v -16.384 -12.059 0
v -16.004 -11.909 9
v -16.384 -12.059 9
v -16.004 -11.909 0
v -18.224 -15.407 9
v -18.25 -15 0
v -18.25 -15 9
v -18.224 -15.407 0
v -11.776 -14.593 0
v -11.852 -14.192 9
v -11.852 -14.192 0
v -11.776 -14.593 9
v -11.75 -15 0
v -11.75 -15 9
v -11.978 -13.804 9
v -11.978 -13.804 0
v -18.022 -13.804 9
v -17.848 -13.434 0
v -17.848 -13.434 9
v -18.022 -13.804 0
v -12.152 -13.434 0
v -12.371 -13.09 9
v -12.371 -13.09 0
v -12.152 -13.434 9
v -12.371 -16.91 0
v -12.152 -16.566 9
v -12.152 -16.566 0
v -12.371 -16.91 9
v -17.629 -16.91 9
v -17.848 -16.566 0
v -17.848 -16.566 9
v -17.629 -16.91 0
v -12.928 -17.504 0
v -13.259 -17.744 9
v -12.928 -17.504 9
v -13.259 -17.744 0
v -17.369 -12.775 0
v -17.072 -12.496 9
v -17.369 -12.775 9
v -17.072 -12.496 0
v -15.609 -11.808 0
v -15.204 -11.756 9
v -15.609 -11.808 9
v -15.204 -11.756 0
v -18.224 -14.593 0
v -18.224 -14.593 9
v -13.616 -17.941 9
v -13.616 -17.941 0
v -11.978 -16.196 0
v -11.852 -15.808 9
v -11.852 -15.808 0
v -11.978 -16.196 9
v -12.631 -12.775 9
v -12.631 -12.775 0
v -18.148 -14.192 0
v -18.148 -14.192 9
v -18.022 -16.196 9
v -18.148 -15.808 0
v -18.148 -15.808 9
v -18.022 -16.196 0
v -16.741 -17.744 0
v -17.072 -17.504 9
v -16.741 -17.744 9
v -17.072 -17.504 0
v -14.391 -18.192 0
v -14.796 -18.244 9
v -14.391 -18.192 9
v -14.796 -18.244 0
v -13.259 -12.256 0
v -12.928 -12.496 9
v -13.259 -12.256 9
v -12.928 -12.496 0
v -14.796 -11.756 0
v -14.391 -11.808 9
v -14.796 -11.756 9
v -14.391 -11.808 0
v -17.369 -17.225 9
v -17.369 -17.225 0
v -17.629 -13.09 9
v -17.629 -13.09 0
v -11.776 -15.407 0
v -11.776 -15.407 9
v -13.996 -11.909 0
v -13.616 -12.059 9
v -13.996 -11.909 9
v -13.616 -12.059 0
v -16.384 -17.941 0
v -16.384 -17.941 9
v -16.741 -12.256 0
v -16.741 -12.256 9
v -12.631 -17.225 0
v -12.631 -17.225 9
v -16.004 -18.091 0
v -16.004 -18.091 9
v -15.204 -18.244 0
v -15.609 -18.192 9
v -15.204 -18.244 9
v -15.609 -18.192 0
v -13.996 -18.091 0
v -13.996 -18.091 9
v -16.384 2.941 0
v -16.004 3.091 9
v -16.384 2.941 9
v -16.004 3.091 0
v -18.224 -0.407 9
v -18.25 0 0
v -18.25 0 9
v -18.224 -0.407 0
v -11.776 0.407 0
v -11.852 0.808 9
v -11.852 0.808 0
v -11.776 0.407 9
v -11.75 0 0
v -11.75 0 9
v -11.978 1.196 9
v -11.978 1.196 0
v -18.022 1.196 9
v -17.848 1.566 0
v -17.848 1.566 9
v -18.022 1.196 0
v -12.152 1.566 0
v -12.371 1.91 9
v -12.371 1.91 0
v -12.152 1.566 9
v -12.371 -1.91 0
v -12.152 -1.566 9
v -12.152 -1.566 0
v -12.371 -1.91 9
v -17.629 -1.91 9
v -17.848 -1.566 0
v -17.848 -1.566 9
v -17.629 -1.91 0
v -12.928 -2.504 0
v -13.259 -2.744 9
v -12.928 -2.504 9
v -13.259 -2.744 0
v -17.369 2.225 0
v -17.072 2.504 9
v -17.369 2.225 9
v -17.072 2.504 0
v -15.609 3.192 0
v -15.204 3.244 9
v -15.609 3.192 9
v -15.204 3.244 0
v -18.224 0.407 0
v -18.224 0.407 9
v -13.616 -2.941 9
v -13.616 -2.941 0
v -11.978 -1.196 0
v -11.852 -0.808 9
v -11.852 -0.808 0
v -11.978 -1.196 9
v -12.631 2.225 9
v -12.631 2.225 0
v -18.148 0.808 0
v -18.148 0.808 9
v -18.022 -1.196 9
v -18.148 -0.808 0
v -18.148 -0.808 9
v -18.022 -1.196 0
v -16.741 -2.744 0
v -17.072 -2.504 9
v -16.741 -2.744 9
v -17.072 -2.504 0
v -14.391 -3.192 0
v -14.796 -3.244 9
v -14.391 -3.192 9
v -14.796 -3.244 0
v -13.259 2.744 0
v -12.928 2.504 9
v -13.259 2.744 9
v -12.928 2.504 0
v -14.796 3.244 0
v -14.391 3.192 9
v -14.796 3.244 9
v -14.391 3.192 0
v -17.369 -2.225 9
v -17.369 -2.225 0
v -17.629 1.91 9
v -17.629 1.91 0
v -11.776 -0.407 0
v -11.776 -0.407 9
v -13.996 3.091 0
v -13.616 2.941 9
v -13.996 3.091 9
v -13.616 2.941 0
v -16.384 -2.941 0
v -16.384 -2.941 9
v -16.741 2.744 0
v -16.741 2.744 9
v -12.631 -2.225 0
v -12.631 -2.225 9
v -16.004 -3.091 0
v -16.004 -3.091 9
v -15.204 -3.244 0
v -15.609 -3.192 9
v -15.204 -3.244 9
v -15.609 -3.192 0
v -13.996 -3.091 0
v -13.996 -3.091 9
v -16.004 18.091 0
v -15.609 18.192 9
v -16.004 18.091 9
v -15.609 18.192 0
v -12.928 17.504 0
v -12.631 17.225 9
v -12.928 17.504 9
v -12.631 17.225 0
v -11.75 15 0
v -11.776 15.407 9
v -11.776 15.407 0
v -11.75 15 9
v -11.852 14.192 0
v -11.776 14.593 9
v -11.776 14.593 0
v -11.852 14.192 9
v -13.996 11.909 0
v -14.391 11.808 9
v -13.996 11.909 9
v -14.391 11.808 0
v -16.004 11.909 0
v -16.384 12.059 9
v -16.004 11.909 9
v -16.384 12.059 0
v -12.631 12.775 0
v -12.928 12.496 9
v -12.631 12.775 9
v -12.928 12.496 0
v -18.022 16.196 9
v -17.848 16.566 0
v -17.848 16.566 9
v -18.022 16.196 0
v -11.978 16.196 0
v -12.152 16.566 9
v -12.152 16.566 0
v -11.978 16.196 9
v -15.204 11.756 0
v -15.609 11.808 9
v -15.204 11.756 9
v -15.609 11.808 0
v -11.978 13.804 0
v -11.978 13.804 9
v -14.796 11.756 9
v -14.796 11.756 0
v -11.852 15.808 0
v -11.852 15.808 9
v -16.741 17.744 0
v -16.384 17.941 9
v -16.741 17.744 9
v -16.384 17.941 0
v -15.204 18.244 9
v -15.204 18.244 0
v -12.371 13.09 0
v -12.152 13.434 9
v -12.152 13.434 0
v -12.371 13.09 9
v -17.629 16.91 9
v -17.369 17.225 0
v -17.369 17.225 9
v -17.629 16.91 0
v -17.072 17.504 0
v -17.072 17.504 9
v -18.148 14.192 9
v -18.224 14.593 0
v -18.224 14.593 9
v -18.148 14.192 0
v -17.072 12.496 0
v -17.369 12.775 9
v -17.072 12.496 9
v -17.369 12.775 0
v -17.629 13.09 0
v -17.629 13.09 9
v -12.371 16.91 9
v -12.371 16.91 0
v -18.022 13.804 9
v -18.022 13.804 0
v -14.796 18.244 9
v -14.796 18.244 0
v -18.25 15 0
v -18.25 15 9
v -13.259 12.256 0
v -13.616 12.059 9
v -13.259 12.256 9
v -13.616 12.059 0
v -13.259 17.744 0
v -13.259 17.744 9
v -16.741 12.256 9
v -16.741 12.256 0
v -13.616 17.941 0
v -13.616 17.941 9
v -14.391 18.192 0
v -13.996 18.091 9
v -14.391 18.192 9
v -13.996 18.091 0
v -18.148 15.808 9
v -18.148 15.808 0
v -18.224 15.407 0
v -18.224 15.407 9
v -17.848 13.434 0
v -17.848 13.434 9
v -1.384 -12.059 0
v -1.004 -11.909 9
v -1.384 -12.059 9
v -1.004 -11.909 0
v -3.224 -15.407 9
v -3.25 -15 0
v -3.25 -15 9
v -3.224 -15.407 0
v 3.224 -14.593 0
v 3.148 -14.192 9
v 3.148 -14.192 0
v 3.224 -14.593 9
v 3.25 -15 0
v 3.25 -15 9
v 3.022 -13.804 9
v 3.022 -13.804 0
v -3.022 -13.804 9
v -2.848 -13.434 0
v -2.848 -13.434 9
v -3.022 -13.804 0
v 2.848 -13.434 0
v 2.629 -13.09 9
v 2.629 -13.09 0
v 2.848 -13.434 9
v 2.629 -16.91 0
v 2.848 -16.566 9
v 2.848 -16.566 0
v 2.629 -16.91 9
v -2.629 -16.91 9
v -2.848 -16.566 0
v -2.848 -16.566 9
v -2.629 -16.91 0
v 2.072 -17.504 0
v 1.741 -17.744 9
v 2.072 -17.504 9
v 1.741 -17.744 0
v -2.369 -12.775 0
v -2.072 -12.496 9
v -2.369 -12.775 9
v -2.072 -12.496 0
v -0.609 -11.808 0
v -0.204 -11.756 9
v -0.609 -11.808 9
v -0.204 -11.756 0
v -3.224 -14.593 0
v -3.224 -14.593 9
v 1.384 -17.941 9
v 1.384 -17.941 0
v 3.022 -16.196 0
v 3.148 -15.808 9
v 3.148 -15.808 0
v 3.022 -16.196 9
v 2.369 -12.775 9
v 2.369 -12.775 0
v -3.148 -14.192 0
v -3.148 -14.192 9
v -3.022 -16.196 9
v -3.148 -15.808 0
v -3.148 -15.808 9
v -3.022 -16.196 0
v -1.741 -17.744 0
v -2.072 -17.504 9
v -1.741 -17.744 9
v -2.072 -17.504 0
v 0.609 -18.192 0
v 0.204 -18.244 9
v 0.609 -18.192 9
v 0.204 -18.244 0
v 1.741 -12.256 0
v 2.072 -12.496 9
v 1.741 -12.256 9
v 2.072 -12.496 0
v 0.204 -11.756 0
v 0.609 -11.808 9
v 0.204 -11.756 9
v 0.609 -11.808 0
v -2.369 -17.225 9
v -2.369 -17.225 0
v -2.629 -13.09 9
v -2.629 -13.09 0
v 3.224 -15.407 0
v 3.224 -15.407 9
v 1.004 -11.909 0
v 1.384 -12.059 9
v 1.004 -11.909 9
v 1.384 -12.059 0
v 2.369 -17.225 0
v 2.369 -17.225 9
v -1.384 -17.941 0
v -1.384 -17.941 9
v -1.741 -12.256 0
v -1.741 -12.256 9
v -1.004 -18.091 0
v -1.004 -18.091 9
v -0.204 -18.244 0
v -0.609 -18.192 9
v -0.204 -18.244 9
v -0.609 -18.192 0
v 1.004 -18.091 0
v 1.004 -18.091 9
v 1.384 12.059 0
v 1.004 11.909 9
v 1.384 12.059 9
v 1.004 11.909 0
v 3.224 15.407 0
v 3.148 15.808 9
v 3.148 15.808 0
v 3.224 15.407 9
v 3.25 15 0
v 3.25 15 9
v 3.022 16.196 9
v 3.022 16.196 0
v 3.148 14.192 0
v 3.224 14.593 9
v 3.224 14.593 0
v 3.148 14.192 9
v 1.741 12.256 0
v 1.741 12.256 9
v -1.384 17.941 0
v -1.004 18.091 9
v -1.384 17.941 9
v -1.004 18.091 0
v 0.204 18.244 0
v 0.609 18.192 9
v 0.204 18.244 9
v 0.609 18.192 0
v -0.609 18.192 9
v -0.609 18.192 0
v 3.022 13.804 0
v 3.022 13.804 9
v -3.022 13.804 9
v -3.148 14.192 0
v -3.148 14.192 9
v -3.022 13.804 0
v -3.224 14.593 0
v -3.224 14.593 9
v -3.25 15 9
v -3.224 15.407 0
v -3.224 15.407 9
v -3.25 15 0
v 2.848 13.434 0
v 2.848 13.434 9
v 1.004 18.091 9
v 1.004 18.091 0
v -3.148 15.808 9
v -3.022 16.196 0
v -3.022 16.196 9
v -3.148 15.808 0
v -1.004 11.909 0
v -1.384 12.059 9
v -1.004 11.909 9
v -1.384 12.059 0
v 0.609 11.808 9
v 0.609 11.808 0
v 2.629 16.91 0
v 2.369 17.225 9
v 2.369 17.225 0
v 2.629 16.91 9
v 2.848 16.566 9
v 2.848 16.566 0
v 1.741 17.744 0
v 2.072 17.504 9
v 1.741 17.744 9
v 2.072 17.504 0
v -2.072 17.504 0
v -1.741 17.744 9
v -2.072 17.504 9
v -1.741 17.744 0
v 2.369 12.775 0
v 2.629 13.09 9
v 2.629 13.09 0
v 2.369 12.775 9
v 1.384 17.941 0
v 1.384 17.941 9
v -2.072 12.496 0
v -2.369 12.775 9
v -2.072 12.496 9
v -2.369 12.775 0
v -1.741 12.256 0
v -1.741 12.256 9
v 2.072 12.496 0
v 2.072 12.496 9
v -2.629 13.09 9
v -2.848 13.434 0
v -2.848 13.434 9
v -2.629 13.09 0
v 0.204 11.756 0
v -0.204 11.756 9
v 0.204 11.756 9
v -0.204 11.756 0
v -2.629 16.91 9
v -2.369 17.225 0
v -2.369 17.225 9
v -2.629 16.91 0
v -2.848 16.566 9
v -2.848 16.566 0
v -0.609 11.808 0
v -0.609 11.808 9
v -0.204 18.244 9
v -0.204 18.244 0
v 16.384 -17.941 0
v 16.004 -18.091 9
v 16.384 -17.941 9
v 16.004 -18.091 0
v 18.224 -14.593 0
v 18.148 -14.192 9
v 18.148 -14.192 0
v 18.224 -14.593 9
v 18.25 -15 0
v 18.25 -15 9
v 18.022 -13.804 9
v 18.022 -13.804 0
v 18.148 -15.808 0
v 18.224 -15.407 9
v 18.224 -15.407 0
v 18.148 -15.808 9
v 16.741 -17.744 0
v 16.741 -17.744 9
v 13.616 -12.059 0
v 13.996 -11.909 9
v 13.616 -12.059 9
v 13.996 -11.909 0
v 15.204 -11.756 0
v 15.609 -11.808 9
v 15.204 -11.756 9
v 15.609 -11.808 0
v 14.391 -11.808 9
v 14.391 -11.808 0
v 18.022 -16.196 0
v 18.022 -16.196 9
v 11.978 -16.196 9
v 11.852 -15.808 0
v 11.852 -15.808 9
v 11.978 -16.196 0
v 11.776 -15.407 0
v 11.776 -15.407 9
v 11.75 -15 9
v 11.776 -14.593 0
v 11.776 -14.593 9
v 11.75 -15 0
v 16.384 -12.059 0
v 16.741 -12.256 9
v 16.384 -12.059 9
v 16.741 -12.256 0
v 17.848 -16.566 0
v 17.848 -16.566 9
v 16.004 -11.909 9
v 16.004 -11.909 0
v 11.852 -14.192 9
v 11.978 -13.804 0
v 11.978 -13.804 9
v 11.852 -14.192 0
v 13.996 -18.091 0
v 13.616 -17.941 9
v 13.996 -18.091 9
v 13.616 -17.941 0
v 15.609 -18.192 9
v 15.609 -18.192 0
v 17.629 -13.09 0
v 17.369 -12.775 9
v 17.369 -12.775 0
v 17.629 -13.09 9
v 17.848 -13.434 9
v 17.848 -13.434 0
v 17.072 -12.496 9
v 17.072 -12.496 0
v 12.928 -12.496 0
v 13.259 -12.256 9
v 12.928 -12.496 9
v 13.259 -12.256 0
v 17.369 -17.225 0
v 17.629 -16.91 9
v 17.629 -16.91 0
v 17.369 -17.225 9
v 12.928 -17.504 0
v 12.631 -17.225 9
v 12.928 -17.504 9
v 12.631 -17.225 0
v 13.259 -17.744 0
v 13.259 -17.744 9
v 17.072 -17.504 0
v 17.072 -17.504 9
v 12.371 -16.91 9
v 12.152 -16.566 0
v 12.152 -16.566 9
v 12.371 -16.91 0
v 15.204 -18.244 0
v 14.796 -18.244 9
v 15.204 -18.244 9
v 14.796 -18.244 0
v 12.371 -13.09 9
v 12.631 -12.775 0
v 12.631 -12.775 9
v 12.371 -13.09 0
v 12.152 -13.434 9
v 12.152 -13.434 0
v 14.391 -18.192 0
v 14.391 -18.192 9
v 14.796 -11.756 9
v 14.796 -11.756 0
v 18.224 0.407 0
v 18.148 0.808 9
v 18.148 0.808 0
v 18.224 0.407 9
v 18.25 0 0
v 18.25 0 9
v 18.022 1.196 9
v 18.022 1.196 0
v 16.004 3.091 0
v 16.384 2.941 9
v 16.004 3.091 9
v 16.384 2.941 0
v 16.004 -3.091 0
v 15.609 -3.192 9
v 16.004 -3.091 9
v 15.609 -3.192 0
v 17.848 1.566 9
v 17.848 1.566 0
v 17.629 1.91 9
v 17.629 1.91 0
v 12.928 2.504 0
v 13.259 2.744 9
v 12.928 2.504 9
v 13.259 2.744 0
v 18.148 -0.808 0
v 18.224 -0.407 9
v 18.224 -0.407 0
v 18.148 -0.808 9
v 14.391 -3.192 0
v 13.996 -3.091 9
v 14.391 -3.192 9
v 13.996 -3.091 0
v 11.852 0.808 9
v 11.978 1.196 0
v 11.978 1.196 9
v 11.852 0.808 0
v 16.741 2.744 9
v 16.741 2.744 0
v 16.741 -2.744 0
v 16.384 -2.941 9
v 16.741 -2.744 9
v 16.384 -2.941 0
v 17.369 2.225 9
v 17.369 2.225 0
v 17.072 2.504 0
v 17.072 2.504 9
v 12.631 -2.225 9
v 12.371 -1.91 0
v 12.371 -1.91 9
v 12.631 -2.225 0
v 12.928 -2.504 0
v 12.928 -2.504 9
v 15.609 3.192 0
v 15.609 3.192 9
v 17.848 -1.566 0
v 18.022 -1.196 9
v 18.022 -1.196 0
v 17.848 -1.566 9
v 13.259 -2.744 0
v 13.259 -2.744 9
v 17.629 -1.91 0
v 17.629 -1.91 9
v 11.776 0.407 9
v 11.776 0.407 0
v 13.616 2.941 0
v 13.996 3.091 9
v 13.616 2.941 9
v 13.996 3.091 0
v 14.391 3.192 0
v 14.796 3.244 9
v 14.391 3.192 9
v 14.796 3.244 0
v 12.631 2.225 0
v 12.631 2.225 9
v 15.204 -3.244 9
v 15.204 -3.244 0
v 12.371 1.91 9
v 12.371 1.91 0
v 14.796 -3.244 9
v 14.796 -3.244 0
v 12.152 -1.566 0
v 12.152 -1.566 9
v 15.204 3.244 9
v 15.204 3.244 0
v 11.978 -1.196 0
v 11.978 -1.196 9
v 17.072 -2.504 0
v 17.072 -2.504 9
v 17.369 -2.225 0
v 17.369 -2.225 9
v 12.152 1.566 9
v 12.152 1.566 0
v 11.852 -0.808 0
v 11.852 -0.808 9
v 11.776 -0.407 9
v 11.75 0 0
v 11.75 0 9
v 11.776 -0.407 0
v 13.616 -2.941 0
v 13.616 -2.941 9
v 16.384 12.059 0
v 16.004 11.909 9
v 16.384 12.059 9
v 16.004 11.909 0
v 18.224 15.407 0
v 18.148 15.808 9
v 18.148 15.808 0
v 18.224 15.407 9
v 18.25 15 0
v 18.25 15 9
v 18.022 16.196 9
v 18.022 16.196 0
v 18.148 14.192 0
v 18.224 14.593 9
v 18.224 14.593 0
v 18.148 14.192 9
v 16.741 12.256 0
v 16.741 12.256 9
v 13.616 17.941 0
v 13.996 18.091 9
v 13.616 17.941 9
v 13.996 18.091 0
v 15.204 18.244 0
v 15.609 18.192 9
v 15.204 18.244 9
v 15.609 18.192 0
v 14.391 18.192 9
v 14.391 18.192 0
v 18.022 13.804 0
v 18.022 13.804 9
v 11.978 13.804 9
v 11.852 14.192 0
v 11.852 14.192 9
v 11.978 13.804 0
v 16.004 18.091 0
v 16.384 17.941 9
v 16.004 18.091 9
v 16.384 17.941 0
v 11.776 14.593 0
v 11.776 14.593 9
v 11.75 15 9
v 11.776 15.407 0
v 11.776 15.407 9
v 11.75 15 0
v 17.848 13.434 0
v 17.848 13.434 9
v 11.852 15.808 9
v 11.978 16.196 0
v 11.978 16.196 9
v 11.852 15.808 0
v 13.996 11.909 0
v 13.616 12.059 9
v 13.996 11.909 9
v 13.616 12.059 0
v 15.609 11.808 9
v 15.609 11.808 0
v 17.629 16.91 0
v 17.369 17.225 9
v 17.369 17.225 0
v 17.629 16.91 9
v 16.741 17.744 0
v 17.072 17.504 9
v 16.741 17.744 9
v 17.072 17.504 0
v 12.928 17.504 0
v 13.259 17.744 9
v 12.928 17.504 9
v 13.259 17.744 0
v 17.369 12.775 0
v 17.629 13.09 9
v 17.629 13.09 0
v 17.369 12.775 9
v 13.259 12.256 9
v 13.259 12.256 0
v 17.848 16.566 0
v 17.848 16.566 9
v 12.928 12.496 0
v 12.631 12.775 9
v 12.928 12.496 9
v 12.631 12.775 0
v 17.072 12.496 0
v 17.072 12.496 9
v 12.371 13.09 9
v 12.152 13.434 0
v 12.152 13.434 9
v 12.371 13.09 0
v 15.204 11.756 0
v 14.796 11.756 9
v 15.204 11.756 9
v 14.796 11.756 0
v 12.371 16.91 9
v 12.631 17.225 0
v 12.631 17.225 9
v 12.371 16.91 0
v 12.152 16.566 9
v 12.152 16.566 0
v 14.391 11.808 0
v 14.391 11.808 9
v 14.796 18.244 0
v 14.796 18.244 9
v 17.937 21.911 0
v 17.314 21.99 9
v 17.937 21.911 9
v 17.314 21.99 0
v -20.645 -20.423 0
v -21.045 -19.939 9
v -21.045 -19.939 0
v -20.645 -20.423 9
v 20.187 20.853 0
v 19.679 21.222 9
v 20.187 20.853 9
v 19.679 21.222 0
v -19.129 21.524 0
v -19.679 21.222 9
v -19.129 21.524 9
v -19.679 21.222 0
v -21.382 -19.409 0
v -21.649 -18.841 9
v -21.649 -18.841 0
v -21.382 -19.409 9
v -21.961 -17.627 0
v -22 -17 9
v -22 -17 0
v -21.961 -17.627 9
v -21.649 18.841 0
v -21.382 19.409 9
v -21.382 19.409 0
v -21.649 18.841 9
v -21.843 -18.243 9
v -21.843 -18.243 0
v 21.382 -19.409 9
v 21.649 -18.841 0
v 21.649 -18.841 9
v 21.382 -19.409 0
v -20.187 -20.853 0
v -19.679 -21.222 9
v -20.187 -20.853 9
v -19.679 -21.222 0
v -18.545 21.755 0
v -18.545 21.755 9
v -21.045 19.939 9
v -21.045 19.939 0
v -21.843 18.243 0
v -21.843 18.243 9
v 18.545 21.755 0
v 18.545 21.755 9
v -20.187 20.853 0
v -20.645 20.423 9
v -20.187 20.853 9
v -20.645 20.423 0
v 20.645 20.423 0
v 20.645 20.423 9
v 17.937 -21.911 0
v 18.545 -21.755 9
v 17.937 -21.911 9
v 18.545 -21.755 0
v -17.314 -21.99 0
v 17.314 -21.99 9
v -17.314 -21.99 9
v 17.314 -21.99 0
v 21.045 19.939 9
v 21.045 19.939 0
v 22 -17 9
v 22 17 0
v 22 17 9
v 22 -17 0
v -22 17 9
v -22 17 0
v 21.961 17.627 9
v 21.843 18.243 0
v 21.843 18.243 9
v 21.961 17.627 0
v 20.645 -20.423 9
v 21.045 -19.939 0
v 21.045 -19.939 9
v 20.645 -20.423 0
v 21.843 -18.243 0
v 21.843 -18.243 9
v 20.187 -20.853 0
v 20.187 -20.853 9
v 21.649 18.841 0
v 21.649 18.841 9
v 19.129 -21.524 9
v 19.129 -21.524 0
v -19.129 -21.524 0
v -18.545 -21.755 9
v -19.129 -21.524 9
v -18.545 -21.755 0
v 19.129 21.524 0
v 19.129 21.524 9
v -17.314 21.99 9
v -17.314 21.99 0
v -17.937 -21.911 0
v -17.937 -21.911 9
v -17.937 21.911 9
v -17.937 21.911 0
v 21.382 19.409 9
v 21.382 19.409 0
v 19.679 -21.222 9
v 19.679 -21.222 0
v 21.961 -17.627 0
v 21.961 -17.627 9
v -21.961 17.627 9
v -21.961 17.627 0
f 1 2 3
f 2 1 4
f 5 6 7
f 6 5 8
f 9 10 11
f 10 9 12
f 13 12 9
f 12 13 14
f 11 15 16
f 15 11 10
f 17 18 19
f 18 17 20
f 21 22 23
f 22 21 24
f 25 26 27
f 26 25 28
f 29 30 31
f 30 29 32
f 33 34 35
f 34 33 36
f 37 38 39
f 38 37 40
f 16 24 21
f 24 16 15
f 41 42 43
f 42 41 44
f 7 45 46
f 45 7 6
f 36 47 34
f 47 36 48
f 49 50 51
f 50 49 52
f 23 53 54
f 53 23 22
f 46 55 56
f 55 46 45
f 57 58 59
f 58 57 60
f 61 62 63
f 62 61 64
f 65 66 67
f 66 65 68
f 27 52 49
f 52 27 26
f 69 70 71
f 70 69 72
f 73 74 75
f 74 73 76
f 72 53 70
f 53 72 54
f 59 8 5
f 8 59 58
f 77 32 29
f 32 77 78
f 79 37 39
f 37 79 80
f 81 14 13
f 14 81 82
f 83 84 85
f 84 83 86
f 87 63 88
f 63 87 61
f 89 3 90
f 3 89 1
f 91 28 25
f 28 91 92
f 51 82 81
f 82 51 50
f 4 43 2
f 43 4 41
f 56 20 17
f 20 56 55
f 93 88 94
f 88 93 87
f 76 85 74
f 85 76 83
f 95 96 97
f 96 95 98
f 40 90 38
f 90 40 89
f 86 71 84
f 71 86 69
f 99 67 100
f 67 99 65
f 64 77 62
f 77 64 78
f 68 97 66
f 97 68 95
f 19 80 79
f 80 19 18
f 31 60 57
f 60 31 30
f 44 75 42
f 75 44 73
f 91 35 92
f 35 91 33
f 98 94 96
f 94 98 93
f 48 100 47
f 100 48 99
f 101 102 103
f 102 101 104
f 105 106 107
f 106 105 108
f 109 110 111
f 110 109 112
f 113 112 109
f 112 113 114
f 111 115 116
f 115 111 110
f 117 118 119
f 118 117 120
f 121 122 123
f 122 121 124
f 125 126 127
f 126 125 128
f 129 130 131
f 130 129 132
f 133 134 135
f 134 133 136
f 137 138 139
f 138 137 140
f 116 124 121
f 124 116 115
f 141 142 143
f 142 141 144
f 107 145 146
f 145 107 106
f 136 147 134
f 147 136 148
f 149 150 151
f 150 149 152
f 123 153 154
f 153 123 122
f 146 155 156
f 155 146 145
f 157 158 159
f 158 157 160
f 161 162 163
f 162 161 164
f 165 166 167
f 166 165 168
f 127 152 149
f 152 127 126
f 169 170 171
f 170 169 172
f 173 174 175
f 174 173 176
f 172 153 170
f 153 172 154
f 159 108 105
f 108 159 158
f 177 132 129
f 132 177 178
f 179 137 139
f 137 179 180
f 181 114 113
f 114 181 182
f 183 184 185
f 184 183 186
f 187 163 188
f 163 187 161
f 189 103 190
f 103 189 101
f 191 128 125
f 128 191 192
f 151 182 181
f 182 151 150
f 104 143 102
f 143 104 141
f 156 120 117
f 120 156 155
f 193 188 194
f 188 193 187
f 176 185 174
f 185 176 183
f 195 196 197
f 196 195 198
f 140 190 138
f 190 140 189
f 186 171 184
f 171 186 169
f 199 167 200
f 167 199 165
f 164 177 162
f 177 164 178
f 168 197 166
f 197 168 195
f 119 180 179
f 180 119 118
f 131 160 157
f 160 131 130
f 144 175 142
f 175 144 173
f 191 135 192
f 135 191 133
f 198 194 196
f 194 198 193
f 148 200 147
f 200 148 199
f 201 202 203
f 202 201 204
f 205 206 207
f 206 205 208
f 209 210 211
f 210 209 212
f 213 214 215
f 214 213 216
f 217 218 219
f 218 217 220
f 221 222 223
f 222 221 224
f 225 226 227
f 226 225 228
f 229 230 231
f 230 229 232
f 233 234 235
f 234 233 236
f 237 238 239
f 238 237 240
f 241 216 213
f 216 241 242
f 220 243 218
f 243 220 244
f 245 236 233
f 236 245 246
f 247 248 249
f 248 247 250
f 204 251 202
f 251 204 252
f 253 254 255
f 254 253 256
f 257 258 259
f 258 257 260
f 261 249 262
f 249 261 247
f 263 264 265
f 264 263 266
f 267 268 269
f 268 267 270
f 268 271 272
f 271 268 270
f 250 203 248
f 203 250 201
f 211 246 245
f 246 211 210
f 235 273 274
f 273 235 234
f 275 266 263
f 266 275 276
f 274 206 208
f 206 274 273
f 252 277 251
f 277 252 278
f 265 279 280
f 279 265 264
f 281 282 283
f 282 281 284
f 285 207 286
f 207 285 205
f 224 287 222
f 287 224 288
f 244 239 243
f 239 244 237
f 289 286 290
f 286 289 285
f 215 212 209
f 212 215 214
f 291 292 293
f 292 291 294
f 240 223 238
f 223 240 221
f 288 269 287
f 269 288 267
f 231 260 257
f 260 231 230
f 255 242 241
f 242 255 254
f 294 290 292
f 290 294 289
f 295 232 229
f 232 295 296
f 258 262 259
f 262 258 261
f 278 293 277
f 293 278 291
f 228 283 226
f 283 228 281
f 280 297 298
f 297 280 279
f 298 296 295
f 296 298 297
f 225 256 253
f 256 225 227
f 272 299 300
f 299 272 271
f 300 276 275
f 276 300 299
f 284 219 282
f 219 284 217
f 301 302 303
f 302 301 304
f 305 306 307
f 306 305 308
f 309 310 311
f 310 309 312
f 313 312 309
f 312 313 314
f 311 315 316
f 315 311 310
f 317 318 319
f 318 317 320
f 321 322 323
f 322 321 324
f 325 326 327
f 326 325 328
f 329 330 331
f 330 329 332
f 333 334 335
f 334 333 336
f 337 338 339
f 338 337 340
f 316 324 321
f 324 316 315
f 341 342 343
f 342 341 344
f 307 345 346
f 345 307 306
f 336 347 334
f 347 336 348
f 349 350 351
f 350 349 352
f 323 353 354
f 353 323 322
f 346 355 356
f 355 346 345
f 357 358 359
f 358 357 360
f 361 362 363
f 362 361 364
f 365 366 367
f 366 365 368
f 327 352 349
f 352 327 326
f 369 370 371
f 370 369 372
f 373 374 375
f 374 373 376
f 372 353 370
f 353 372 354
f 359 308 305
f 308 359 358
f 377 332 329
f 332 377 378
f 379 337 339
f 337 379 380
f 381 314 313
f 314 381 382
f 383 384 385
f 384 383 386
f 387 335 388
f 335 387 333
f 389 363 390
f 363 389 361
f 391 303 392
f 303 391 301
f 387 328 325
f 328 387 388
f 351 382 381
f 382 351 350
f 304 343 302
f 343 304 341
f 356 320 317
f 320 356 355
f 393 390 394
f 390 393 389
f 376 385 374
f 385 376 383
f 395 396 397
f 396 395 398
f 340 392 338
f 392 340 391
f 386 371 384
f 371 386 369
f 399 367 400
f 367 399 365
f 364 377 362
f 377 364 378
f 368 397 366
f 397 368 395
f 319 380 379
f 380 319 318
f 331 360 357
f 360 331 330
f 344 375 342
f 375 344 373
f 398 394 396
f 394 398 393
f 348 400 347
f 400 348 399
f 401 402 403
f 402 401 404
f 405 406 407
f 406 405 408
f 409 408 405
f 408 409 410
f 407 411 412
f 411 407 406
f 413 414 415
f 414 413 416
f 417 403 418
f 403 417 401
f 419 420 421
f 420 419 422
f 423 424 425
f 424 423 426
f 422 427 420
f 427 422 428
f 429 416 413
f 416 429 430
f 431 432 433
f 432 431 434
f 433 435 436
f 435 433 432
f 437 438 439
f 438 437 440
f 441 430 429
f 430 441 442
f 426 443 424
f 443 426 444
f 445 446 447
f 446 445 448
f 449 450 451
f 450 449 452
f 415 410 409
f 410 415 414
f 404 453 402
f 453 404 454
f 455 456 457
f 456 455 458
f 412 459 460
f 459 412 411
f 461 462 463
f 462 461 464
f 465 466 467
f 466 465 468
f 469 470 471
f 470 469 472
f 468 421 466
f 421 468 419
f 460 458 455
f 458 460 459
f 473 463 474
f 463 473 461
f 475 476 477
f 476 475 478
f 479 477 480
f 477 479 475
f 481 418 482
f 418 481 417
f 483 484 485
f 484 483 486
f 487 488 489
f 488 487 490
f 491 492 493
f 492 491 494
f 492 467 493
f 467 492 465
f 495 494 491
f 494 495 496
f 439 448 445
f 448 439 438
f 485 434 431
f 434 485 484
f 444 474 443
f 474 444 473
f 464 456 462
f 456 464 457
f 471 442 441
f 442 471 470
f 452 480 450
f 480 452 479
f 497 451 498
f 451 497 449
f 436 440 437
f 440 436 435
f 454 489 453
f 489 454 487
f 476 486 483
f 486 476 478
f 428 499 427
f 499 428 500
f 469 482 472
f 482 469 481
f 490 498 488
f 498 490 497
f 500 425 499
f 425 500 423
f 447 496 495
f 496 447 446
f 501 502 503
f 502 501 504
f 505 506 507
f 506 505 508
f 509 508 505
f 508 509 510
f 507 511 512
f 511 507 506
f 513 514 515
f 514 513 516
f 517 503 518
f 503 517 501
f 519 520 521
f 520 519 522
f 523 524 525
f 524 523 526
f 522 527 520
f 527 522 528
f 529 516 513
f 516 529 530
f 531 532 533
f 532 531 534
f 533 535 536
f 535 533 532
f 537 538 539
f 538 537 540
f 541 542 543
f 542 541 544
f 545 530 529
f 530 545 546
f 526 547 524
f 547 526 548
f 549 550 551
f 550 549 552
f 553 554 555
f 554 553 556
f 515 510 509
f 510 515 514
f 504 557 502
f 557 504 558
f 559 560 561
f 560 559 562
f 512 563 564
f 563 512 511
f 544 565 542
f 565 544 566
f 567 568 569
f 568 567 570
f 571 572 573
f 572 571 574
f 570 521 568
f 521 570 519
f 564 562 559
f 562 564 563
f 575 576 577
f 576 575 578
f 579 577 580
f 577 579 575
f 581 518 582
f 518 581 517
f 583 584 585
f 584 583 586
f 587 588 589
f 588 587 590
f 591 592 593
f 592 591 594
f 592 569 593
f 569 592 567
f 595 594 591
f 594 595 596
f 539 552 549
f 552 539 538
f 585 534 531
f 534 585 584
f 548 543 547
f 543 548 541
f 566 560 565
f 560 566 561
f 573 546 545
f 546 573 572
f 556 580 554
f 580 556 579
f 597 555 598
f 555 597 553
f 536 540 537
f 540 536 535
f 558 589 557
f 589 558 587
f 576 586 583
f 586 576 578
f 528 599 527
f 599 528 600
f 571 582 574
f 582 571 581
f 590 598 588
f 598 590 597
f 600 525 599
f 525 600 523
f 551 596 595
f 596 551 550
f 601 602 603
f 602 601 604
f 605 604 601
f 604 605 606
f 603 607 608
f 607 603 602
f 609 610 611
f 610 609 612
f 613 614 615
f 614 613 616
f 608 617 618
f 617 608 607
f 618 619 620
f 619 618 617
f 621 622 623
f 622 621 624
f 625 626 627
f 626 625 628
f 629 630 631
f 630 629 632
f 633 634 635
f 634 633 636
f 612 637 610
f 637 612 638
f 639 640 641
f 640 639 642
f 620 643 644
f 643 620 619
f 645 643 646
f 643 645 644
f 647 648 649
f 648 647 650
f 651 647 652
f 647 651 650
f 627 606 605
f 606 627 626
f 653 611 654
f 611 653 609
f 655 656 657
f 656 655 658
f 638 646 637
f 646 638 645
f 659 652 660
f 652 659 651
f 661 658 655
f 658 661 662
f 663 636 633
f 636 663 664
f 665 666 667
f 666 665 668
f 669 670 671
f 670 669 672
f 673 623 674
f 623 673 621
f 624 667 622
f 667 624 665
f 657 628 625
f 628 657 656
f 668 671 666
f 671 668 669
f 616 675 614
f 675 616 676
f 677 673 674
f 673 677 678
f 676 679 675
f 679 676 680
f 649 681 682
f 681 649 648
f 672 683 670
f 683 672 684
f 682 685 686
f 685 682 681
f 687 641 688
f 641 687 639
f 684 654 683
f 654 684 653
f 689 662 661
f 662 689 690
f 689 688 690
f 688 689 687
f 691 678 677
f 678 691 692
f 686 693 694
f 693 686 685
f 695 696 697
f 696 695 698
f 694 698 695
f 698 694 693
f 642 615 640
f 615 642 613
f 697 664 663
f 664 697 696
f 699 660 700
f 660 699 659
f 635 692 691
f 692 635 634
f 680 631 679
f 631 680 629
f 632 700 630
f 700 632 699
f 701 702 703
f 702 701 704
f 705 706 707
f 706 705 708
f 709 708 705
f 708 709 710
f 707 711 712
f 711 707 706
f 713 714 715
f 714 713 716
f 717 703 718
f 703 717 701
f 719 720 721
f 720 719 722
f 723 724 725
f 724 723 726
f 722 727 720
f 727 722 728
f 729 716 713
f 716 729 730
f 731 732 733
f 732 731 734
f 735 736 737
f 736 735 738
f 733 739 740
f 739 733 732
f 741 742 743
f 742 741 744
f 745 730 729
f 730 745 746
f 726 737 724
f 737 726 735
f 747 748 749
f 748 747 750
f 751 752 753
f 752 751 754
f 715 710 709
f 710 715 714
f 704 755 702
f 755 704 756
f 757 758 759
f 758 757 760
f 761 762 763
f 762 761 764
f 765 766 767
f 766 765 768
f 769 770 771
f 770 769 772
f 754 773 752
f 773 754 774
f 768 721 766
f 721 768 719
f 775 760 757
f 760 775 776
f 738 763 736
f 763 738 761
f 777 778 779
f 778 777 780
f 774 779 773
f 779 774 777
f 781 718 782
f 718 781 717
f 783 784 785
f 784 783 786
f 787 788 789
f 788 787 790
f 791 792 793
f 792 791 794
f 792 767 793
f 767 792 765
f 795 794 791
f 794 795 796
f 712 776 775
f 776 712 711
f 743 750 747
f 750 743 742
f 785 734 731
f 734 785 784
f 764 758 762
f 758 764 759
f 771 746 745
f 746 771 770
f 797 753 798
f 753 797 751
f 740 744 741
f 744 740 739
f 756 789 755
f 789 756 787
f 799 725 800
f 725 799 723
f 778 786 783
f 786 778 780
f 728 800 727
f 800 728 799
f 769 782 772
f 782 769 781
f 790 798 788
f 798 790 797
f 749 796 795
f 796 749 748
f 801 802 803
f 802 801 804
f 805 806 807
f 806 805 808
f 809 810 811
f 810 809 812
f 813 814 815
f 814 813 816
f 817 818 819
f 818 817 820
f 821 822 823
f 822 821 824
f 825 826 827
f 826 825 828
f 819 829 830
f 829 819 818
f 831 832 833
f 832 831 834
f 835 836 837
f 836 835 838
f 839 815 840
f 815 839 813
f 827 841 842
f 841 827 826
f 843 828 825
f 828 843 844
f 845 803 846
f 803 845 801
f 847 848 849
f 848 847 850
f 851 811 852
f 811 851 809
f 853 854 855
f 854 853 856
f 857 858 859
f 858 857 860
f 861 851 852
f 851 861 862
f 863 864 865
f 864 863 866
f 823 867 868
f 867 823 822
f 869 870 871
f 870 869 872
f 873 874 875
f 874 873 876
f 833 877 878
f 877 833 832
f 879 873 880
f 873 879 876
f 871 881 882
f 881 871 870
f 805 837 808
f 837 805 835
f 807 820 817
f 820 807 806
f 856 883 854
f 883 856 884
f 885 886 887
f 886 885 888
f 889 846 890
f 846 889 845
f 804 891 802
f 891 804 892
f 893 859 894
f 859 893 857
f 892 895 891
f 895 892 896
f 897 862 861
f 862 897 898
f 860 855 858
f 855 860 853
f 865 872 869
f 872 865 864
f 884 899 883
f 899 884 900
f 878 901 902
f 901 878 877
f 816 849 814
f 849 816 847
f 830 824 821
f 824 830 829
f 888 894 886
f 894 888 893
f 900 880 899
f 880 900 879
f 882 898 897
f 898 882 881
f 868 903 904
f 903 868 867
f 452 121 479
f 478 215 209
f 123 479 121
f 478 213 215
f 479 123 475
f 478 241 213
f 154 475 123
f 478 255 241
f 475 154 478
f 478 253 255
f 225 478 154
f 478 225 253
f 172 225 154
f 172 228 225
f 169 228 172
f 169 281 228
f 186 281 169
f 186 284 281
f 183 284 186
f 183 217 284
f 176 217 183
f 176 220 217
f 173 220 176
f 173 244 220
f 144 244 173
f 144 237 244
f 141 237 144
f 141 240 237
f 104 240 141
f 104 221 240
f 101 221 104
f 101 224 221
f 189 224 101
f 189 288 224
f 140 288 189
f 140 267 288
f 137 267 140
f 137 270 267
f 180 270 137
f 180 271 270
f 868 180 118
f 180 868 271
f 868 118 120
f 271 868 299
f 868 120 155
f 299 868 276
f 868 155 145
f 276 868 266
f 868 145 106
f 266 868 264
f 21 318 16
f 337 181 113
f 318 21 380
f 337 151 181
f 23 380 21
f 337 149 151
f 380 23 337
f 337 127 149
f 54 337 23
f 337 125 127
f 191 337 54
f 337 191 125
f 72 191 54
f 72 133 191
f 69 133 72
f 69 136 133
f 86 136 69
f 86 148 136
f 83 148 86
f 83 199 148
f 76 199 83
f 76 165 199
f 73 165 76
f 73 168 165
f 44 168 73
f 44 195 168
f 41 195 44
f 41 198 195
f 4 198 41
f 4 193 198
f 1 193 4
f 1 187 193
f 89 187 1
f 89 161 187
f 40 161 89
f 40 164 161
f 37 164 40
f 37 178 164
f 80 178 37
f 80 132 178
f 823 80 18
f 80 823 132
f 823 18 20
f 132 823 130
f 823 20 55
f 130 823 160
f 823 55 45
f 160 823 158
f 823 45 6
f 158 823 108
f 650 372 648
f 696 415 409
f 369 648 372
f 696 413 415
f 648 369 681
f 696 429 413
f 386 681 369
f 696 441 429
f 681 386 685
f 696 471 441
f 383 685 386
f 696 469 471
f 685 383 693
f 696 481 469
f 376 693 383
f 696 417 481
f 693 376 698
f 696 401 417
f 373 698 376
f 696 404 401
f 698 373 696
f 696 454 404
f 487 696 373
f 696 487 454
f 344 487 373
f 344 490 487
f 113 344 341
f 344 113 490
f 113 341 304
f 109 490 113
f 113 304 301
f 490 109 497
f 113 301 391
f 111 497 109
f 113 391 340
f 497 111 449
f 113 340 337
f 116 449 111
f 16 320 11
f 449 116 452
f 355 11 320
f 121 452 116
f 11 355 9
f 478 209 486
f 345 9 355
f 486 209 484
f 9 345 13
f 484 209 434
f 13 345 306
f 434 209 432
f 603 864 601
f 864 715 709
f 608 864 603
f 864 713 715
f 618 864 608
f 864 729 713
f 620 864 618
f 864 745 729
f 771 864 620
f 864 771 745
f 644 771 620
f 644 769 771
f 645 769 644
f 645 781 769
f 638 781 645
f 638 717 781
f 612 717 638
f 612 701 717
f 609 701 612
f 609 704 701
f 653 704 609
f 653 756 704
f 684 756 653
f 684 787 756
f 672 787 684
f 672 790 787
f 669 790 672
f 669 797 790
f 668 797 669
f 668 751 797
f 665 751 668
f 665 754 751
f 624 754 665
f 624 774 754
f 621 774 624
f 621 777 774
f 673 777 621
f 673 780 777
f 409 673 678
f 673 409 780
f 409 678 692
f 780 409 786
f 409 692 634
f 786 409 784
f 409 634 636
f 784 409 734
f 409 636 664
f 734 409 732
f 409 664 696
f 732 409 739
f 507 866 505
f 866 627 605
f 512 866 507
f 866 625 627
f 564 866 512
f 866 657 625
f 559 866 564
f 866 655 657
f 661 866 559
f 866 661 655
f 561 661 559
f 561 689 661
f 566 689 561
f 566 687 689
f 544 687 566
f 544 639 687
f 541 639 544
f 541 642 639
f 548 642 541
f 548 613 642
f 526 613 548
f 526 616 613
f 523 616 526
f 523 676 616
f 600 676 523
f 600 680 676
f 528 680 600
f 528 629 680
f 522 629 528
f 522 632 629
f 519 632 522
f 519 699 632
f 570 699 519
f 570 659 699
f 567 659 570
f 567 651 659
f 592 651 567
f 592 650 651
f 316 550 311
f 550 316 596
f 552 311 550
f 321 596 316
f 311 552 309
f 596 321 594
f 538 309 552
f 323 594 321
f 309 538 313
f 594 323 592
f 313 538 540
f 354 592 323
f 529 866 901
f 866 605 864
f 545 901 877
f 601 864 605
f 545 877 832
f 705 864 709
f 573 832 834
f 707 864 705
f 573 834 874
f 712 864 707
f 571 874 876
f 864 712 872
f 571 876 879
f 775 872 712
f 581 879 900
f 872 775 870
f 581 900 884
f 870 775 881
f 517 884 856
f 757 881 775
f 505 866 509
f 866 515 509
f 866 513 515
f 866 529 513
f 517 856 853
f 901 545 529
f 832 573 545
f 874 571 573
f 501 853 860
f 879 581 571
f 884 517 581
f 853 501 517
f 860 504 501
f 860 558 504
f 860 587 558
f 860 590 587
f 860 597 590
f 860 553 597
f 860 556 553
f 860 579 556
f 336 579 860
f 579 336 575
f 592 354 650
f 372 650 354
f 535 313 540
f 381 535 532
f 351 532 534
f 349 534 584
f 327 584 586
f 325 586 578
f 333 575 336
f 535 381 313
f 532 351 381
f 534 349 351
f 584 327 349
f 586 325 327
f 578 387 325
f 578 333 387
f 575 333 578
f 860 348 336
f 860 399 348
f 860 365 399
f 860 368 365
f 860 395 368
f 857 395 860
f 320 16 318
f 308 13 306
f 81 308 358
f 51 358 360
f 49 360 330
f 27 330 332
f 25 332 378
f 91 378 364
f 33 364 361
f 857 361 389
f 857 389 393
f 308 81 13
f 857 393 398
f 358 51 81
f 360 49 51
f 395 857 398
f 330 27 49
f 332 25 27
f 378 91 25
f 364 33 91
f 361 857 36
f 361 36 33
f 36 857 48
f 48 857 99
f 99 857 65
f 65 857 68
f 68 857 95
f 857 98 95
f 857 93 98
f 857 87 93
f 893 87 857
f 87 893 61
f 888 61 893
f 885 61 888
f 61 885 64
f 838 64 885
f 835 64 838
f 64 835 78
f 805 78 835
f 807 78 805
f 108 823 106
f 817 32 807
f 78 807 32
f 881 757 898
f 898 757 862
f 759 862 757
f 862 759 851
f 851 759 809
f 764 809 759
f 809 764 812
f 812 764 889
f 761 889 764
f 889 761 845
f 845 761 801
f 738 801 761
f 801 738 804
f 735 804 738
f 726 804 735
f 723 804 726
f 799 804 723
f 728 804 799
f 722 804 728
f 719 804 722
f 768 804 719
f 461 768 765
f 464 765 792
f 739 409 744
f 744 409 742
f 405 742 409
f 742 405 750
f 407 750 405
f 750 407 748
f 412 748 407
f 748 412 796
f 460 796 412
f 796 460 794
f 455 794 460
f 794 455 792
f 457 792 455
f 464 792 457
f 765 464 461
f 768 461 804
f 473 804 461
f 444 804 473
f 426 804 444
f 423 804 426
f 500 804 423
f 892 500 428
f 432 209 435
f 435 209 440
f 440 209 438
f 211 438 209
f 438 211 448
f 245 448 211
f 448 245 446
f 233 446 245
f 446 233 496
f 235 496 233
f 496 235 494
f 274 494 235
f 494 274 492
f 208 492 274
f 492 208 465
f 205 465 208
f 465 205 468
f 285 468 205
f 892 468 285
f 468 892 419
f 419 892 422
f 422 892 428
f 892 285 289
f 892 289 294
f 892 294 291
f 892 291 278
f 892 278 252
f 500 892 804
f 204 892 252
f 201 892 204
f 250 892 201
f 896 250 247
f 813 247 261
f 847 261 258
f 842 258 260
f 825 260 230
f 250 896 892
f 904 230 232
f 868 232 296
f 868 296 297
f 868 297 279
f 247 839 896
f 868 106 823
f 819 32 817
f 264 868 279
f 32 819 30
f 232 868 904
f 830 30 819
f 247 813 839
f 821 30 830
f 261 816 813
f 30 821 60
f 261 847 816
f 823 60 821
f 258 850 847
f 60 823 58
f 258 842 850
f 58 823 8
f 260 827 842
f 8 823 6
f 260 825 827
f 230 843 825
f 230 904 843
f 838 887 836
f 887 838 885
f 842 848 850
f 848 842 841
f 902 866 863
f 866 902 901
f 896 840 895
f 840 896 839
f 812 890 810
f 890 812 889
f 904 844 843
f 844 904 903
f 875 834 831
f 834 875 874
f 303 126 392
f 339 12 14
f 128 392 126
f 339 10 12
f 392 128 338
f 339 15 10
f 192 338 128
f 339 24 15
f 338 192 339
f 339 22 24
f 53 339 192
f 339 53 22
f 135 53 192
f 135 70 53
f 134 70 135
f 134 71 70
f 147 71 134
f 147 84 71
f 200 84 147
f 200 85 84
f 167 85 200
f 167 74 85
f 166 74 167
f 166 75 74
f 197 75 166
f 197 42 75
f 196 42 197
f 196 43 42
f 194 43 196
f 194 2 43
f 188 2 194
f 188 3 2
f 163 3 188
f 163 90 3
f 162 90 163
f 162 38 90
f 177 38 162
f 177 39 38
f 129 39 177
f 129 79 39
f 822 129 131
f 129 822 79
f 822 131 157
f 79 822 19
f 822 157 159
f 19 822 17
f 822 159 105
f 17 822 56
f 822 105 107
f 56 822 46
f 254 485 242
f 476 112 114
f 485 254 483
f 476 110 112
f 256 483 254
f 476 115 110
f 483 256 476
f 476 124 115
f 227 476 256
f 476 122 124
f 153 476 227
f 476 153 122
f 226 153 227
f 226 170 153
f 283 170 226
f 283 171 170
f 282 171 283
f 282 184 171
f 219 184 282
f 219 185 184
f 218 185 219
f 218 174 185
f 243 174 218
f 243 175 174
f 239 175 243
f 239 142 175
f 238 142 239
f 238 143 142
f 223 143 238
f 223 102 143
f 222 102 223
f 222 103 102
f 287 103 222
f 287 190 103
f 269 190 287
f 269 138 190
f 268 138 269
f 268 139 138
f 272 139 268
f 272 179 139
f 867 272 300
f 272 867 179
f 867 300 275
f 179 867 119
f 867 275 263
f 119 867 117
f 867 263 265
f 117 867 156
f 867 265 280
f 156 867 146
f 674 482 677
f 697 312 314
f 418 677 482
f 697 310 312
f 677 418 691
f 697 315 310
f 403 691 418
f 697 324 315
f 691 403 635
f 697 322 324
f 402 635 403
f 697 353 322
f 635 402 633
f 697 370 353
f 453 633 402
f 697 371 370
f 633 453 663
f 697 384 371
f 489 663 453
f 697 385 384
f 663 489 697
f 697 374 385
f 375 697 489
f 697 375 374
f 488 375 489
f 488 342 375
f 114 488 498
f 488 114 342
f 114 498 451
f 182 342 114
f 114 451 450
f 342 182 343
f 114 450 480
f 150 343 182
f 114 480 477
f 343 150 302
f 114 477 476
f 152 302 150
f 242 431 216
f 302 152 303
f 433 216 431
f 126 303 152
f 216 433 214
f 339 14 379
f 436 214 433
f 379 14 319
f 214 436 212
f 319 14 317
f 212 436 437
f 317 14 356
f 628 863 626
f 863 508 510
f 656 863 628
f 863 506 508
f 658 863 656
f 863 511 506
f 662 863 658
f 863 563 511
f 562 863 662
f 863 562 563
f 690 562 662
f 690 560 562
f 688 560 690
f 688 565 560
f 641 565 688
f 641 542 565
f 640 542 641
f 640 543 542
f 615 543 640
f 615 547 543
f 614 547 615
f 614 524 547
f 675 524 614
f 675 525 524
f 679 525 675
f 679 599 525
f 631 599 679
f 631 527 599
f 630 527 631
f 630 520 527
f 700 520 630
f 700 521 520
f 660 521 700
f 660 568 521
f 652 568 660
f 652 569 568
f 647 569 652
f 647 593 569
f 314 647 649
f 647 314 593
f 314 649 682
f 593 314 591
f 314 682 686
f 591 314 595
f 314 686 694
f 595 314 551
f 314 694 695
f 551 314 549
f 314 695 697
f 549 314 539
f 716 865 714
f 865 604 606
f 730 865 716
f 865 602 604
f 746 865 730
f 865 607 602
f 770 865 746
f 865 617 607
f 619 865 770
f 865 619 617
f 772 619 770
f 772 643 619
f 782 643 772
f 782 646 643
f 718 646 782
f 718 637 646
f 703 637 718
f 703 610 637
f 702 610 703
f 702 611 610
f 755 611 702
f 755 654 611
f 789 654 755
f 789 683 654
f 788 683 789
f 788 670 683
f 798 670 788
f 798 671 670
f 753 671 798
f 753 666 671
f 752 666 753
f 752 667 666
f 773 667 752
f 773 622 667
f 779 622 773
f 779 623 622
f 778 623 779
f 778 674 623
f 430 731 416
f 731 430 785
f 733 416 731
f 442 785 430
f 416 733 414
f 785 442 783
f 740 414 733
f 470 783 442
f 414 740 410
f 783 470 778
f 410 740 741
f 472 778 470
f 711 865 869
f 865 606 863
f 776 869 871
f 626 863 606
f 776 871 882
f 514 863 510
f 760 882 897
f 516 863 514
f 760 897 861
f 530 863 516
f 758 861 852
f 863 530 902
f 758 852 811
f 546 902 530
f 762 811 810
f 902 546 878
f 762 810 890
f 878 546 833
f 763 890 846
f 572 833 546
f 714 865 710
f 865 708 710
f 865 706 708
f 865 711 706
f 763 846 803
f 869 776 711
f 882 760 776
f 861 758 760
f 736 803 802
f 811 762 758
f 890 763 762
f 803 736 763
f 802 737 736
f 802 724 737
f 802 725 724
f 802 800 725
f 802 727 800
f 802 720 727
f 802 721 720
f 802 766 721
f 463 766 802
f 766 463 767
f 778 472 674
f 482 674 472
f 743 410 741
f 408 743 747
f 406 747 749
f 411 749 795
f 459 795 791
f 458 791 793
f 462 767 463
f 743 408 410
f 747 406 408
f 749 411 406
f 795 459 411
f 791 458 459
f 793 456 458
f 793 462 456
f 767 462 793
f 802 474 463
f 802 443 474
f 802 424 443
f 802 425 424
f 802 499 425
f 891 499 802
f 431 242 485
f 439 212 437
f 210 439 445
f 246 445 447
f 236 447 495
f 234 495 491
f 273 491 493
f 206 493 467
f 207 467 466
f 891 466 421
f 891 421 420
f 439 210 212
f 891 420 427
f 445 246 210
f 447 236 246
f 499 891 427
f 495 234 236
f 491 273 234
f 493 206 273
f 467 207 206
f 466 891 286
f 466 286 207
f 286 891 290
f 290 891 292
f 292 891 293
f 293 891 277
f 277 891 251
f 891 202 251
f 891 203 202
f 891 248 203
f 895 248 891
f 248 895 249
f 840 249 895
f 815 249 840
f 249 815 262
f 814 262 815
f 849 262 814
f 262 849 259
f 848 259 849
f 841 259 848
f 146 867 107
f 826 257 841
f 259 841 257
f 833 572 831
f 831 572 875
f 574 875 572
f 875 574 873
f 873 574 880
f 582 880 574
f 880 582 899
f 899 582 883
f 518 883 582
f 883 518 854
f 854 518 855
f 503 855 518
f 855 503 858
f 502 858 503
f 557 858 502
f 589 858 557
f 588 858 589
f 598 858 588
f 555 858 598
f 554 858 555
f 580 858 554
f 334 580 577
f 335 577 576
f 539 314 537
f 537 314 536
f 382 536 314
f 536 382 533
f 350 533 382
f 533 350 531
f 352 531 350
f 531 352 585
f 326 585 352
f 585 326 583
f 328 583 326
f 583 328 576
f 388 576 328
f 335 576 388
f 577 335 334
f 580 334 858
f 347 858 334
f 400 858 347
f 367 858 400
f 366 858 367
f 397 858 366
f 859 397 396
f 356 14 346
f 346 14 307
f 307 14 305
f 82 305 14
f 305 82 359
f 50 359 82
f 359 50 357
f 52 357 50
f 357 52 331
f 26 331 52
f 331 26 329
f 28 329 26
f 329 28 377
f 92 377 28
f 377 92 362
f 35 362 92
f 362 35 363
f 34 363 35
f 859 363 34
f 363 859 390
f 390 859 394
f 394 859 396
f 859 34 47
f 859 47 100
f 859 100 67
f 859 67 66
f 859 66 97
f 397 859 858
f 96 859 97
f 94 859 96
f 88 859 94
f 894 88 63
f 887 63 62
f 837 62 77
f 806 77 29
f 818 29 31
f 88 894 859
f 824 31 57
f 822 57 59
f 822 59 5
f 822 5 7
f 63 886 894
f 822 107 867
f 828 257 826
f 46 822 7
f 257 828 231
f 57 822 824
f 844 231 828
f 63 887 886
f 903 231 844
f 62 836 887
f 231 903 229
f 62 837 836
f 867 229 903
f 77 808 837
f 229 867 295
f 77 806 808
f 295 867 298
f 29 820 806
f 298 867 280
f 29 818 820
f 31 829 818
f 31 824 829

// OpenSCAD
$fn = 50;


difference() {
	union() {
		hull() {
			translate(v = [-17.0000000000, 17.0000000000, 0]) {
				cylinder(h = 9, r = 5);
			}
			translate(v = [17.0000000000, 17.0000000000, 0]) {
				cylinder(h = 9, r = 5);
			}
			translate(v = [-17.0000000000, -17.0000000000, 0]) {
				cylinder(h = 9, r = 5);
			}
			translate(v = [17.0000000000, -17.0000000000, 0]) {
				cylinder(h = 9, r = 5);
			}
		}
	}
	union() {
		translate(v = [-15.0000000000, -15.0000000000, -100.0000000000]) {
			cylinder(h = 200, r = 3.2500000000);
		}
		translate(v = [-15.0000000000, 0.0000000000, -100.0000000000]) {
			cylinder(h = 200, r = 3.2500000000);
		}
		translate(v = [-15.0000000000, 15.0000000000, -100.0000000000]) {
			cylinder(h = 200, r = 3.2500000000);
		}
		translate(v = [0.0000000000, -15.0000000000, -100.0000000000]) {
			cylinder(h = 200, r = 3.2500000000);
		}
		translate(v = [0.0000000000, 15.0000000000, -100.0000000000]) {
			cylinder(h = 200, r = 3.2500000000);
		}
		translate(v = [15.0000000000, -15.0000000000, -100.0000000000]) {
			cylinder(h = 200, r = 3.2500000000);
		}
		translate(v = [15.0000000000, 0.0000000000, -100.0000000000]) {
			cylinder(h = 200, r = 3.2500000000);
		}
		translate(v = [15.0000000000, 15.0000000000, -100.0000000000]) {
			cylinder(h = 200, r = 3.2500000000);
		}
	}
}
